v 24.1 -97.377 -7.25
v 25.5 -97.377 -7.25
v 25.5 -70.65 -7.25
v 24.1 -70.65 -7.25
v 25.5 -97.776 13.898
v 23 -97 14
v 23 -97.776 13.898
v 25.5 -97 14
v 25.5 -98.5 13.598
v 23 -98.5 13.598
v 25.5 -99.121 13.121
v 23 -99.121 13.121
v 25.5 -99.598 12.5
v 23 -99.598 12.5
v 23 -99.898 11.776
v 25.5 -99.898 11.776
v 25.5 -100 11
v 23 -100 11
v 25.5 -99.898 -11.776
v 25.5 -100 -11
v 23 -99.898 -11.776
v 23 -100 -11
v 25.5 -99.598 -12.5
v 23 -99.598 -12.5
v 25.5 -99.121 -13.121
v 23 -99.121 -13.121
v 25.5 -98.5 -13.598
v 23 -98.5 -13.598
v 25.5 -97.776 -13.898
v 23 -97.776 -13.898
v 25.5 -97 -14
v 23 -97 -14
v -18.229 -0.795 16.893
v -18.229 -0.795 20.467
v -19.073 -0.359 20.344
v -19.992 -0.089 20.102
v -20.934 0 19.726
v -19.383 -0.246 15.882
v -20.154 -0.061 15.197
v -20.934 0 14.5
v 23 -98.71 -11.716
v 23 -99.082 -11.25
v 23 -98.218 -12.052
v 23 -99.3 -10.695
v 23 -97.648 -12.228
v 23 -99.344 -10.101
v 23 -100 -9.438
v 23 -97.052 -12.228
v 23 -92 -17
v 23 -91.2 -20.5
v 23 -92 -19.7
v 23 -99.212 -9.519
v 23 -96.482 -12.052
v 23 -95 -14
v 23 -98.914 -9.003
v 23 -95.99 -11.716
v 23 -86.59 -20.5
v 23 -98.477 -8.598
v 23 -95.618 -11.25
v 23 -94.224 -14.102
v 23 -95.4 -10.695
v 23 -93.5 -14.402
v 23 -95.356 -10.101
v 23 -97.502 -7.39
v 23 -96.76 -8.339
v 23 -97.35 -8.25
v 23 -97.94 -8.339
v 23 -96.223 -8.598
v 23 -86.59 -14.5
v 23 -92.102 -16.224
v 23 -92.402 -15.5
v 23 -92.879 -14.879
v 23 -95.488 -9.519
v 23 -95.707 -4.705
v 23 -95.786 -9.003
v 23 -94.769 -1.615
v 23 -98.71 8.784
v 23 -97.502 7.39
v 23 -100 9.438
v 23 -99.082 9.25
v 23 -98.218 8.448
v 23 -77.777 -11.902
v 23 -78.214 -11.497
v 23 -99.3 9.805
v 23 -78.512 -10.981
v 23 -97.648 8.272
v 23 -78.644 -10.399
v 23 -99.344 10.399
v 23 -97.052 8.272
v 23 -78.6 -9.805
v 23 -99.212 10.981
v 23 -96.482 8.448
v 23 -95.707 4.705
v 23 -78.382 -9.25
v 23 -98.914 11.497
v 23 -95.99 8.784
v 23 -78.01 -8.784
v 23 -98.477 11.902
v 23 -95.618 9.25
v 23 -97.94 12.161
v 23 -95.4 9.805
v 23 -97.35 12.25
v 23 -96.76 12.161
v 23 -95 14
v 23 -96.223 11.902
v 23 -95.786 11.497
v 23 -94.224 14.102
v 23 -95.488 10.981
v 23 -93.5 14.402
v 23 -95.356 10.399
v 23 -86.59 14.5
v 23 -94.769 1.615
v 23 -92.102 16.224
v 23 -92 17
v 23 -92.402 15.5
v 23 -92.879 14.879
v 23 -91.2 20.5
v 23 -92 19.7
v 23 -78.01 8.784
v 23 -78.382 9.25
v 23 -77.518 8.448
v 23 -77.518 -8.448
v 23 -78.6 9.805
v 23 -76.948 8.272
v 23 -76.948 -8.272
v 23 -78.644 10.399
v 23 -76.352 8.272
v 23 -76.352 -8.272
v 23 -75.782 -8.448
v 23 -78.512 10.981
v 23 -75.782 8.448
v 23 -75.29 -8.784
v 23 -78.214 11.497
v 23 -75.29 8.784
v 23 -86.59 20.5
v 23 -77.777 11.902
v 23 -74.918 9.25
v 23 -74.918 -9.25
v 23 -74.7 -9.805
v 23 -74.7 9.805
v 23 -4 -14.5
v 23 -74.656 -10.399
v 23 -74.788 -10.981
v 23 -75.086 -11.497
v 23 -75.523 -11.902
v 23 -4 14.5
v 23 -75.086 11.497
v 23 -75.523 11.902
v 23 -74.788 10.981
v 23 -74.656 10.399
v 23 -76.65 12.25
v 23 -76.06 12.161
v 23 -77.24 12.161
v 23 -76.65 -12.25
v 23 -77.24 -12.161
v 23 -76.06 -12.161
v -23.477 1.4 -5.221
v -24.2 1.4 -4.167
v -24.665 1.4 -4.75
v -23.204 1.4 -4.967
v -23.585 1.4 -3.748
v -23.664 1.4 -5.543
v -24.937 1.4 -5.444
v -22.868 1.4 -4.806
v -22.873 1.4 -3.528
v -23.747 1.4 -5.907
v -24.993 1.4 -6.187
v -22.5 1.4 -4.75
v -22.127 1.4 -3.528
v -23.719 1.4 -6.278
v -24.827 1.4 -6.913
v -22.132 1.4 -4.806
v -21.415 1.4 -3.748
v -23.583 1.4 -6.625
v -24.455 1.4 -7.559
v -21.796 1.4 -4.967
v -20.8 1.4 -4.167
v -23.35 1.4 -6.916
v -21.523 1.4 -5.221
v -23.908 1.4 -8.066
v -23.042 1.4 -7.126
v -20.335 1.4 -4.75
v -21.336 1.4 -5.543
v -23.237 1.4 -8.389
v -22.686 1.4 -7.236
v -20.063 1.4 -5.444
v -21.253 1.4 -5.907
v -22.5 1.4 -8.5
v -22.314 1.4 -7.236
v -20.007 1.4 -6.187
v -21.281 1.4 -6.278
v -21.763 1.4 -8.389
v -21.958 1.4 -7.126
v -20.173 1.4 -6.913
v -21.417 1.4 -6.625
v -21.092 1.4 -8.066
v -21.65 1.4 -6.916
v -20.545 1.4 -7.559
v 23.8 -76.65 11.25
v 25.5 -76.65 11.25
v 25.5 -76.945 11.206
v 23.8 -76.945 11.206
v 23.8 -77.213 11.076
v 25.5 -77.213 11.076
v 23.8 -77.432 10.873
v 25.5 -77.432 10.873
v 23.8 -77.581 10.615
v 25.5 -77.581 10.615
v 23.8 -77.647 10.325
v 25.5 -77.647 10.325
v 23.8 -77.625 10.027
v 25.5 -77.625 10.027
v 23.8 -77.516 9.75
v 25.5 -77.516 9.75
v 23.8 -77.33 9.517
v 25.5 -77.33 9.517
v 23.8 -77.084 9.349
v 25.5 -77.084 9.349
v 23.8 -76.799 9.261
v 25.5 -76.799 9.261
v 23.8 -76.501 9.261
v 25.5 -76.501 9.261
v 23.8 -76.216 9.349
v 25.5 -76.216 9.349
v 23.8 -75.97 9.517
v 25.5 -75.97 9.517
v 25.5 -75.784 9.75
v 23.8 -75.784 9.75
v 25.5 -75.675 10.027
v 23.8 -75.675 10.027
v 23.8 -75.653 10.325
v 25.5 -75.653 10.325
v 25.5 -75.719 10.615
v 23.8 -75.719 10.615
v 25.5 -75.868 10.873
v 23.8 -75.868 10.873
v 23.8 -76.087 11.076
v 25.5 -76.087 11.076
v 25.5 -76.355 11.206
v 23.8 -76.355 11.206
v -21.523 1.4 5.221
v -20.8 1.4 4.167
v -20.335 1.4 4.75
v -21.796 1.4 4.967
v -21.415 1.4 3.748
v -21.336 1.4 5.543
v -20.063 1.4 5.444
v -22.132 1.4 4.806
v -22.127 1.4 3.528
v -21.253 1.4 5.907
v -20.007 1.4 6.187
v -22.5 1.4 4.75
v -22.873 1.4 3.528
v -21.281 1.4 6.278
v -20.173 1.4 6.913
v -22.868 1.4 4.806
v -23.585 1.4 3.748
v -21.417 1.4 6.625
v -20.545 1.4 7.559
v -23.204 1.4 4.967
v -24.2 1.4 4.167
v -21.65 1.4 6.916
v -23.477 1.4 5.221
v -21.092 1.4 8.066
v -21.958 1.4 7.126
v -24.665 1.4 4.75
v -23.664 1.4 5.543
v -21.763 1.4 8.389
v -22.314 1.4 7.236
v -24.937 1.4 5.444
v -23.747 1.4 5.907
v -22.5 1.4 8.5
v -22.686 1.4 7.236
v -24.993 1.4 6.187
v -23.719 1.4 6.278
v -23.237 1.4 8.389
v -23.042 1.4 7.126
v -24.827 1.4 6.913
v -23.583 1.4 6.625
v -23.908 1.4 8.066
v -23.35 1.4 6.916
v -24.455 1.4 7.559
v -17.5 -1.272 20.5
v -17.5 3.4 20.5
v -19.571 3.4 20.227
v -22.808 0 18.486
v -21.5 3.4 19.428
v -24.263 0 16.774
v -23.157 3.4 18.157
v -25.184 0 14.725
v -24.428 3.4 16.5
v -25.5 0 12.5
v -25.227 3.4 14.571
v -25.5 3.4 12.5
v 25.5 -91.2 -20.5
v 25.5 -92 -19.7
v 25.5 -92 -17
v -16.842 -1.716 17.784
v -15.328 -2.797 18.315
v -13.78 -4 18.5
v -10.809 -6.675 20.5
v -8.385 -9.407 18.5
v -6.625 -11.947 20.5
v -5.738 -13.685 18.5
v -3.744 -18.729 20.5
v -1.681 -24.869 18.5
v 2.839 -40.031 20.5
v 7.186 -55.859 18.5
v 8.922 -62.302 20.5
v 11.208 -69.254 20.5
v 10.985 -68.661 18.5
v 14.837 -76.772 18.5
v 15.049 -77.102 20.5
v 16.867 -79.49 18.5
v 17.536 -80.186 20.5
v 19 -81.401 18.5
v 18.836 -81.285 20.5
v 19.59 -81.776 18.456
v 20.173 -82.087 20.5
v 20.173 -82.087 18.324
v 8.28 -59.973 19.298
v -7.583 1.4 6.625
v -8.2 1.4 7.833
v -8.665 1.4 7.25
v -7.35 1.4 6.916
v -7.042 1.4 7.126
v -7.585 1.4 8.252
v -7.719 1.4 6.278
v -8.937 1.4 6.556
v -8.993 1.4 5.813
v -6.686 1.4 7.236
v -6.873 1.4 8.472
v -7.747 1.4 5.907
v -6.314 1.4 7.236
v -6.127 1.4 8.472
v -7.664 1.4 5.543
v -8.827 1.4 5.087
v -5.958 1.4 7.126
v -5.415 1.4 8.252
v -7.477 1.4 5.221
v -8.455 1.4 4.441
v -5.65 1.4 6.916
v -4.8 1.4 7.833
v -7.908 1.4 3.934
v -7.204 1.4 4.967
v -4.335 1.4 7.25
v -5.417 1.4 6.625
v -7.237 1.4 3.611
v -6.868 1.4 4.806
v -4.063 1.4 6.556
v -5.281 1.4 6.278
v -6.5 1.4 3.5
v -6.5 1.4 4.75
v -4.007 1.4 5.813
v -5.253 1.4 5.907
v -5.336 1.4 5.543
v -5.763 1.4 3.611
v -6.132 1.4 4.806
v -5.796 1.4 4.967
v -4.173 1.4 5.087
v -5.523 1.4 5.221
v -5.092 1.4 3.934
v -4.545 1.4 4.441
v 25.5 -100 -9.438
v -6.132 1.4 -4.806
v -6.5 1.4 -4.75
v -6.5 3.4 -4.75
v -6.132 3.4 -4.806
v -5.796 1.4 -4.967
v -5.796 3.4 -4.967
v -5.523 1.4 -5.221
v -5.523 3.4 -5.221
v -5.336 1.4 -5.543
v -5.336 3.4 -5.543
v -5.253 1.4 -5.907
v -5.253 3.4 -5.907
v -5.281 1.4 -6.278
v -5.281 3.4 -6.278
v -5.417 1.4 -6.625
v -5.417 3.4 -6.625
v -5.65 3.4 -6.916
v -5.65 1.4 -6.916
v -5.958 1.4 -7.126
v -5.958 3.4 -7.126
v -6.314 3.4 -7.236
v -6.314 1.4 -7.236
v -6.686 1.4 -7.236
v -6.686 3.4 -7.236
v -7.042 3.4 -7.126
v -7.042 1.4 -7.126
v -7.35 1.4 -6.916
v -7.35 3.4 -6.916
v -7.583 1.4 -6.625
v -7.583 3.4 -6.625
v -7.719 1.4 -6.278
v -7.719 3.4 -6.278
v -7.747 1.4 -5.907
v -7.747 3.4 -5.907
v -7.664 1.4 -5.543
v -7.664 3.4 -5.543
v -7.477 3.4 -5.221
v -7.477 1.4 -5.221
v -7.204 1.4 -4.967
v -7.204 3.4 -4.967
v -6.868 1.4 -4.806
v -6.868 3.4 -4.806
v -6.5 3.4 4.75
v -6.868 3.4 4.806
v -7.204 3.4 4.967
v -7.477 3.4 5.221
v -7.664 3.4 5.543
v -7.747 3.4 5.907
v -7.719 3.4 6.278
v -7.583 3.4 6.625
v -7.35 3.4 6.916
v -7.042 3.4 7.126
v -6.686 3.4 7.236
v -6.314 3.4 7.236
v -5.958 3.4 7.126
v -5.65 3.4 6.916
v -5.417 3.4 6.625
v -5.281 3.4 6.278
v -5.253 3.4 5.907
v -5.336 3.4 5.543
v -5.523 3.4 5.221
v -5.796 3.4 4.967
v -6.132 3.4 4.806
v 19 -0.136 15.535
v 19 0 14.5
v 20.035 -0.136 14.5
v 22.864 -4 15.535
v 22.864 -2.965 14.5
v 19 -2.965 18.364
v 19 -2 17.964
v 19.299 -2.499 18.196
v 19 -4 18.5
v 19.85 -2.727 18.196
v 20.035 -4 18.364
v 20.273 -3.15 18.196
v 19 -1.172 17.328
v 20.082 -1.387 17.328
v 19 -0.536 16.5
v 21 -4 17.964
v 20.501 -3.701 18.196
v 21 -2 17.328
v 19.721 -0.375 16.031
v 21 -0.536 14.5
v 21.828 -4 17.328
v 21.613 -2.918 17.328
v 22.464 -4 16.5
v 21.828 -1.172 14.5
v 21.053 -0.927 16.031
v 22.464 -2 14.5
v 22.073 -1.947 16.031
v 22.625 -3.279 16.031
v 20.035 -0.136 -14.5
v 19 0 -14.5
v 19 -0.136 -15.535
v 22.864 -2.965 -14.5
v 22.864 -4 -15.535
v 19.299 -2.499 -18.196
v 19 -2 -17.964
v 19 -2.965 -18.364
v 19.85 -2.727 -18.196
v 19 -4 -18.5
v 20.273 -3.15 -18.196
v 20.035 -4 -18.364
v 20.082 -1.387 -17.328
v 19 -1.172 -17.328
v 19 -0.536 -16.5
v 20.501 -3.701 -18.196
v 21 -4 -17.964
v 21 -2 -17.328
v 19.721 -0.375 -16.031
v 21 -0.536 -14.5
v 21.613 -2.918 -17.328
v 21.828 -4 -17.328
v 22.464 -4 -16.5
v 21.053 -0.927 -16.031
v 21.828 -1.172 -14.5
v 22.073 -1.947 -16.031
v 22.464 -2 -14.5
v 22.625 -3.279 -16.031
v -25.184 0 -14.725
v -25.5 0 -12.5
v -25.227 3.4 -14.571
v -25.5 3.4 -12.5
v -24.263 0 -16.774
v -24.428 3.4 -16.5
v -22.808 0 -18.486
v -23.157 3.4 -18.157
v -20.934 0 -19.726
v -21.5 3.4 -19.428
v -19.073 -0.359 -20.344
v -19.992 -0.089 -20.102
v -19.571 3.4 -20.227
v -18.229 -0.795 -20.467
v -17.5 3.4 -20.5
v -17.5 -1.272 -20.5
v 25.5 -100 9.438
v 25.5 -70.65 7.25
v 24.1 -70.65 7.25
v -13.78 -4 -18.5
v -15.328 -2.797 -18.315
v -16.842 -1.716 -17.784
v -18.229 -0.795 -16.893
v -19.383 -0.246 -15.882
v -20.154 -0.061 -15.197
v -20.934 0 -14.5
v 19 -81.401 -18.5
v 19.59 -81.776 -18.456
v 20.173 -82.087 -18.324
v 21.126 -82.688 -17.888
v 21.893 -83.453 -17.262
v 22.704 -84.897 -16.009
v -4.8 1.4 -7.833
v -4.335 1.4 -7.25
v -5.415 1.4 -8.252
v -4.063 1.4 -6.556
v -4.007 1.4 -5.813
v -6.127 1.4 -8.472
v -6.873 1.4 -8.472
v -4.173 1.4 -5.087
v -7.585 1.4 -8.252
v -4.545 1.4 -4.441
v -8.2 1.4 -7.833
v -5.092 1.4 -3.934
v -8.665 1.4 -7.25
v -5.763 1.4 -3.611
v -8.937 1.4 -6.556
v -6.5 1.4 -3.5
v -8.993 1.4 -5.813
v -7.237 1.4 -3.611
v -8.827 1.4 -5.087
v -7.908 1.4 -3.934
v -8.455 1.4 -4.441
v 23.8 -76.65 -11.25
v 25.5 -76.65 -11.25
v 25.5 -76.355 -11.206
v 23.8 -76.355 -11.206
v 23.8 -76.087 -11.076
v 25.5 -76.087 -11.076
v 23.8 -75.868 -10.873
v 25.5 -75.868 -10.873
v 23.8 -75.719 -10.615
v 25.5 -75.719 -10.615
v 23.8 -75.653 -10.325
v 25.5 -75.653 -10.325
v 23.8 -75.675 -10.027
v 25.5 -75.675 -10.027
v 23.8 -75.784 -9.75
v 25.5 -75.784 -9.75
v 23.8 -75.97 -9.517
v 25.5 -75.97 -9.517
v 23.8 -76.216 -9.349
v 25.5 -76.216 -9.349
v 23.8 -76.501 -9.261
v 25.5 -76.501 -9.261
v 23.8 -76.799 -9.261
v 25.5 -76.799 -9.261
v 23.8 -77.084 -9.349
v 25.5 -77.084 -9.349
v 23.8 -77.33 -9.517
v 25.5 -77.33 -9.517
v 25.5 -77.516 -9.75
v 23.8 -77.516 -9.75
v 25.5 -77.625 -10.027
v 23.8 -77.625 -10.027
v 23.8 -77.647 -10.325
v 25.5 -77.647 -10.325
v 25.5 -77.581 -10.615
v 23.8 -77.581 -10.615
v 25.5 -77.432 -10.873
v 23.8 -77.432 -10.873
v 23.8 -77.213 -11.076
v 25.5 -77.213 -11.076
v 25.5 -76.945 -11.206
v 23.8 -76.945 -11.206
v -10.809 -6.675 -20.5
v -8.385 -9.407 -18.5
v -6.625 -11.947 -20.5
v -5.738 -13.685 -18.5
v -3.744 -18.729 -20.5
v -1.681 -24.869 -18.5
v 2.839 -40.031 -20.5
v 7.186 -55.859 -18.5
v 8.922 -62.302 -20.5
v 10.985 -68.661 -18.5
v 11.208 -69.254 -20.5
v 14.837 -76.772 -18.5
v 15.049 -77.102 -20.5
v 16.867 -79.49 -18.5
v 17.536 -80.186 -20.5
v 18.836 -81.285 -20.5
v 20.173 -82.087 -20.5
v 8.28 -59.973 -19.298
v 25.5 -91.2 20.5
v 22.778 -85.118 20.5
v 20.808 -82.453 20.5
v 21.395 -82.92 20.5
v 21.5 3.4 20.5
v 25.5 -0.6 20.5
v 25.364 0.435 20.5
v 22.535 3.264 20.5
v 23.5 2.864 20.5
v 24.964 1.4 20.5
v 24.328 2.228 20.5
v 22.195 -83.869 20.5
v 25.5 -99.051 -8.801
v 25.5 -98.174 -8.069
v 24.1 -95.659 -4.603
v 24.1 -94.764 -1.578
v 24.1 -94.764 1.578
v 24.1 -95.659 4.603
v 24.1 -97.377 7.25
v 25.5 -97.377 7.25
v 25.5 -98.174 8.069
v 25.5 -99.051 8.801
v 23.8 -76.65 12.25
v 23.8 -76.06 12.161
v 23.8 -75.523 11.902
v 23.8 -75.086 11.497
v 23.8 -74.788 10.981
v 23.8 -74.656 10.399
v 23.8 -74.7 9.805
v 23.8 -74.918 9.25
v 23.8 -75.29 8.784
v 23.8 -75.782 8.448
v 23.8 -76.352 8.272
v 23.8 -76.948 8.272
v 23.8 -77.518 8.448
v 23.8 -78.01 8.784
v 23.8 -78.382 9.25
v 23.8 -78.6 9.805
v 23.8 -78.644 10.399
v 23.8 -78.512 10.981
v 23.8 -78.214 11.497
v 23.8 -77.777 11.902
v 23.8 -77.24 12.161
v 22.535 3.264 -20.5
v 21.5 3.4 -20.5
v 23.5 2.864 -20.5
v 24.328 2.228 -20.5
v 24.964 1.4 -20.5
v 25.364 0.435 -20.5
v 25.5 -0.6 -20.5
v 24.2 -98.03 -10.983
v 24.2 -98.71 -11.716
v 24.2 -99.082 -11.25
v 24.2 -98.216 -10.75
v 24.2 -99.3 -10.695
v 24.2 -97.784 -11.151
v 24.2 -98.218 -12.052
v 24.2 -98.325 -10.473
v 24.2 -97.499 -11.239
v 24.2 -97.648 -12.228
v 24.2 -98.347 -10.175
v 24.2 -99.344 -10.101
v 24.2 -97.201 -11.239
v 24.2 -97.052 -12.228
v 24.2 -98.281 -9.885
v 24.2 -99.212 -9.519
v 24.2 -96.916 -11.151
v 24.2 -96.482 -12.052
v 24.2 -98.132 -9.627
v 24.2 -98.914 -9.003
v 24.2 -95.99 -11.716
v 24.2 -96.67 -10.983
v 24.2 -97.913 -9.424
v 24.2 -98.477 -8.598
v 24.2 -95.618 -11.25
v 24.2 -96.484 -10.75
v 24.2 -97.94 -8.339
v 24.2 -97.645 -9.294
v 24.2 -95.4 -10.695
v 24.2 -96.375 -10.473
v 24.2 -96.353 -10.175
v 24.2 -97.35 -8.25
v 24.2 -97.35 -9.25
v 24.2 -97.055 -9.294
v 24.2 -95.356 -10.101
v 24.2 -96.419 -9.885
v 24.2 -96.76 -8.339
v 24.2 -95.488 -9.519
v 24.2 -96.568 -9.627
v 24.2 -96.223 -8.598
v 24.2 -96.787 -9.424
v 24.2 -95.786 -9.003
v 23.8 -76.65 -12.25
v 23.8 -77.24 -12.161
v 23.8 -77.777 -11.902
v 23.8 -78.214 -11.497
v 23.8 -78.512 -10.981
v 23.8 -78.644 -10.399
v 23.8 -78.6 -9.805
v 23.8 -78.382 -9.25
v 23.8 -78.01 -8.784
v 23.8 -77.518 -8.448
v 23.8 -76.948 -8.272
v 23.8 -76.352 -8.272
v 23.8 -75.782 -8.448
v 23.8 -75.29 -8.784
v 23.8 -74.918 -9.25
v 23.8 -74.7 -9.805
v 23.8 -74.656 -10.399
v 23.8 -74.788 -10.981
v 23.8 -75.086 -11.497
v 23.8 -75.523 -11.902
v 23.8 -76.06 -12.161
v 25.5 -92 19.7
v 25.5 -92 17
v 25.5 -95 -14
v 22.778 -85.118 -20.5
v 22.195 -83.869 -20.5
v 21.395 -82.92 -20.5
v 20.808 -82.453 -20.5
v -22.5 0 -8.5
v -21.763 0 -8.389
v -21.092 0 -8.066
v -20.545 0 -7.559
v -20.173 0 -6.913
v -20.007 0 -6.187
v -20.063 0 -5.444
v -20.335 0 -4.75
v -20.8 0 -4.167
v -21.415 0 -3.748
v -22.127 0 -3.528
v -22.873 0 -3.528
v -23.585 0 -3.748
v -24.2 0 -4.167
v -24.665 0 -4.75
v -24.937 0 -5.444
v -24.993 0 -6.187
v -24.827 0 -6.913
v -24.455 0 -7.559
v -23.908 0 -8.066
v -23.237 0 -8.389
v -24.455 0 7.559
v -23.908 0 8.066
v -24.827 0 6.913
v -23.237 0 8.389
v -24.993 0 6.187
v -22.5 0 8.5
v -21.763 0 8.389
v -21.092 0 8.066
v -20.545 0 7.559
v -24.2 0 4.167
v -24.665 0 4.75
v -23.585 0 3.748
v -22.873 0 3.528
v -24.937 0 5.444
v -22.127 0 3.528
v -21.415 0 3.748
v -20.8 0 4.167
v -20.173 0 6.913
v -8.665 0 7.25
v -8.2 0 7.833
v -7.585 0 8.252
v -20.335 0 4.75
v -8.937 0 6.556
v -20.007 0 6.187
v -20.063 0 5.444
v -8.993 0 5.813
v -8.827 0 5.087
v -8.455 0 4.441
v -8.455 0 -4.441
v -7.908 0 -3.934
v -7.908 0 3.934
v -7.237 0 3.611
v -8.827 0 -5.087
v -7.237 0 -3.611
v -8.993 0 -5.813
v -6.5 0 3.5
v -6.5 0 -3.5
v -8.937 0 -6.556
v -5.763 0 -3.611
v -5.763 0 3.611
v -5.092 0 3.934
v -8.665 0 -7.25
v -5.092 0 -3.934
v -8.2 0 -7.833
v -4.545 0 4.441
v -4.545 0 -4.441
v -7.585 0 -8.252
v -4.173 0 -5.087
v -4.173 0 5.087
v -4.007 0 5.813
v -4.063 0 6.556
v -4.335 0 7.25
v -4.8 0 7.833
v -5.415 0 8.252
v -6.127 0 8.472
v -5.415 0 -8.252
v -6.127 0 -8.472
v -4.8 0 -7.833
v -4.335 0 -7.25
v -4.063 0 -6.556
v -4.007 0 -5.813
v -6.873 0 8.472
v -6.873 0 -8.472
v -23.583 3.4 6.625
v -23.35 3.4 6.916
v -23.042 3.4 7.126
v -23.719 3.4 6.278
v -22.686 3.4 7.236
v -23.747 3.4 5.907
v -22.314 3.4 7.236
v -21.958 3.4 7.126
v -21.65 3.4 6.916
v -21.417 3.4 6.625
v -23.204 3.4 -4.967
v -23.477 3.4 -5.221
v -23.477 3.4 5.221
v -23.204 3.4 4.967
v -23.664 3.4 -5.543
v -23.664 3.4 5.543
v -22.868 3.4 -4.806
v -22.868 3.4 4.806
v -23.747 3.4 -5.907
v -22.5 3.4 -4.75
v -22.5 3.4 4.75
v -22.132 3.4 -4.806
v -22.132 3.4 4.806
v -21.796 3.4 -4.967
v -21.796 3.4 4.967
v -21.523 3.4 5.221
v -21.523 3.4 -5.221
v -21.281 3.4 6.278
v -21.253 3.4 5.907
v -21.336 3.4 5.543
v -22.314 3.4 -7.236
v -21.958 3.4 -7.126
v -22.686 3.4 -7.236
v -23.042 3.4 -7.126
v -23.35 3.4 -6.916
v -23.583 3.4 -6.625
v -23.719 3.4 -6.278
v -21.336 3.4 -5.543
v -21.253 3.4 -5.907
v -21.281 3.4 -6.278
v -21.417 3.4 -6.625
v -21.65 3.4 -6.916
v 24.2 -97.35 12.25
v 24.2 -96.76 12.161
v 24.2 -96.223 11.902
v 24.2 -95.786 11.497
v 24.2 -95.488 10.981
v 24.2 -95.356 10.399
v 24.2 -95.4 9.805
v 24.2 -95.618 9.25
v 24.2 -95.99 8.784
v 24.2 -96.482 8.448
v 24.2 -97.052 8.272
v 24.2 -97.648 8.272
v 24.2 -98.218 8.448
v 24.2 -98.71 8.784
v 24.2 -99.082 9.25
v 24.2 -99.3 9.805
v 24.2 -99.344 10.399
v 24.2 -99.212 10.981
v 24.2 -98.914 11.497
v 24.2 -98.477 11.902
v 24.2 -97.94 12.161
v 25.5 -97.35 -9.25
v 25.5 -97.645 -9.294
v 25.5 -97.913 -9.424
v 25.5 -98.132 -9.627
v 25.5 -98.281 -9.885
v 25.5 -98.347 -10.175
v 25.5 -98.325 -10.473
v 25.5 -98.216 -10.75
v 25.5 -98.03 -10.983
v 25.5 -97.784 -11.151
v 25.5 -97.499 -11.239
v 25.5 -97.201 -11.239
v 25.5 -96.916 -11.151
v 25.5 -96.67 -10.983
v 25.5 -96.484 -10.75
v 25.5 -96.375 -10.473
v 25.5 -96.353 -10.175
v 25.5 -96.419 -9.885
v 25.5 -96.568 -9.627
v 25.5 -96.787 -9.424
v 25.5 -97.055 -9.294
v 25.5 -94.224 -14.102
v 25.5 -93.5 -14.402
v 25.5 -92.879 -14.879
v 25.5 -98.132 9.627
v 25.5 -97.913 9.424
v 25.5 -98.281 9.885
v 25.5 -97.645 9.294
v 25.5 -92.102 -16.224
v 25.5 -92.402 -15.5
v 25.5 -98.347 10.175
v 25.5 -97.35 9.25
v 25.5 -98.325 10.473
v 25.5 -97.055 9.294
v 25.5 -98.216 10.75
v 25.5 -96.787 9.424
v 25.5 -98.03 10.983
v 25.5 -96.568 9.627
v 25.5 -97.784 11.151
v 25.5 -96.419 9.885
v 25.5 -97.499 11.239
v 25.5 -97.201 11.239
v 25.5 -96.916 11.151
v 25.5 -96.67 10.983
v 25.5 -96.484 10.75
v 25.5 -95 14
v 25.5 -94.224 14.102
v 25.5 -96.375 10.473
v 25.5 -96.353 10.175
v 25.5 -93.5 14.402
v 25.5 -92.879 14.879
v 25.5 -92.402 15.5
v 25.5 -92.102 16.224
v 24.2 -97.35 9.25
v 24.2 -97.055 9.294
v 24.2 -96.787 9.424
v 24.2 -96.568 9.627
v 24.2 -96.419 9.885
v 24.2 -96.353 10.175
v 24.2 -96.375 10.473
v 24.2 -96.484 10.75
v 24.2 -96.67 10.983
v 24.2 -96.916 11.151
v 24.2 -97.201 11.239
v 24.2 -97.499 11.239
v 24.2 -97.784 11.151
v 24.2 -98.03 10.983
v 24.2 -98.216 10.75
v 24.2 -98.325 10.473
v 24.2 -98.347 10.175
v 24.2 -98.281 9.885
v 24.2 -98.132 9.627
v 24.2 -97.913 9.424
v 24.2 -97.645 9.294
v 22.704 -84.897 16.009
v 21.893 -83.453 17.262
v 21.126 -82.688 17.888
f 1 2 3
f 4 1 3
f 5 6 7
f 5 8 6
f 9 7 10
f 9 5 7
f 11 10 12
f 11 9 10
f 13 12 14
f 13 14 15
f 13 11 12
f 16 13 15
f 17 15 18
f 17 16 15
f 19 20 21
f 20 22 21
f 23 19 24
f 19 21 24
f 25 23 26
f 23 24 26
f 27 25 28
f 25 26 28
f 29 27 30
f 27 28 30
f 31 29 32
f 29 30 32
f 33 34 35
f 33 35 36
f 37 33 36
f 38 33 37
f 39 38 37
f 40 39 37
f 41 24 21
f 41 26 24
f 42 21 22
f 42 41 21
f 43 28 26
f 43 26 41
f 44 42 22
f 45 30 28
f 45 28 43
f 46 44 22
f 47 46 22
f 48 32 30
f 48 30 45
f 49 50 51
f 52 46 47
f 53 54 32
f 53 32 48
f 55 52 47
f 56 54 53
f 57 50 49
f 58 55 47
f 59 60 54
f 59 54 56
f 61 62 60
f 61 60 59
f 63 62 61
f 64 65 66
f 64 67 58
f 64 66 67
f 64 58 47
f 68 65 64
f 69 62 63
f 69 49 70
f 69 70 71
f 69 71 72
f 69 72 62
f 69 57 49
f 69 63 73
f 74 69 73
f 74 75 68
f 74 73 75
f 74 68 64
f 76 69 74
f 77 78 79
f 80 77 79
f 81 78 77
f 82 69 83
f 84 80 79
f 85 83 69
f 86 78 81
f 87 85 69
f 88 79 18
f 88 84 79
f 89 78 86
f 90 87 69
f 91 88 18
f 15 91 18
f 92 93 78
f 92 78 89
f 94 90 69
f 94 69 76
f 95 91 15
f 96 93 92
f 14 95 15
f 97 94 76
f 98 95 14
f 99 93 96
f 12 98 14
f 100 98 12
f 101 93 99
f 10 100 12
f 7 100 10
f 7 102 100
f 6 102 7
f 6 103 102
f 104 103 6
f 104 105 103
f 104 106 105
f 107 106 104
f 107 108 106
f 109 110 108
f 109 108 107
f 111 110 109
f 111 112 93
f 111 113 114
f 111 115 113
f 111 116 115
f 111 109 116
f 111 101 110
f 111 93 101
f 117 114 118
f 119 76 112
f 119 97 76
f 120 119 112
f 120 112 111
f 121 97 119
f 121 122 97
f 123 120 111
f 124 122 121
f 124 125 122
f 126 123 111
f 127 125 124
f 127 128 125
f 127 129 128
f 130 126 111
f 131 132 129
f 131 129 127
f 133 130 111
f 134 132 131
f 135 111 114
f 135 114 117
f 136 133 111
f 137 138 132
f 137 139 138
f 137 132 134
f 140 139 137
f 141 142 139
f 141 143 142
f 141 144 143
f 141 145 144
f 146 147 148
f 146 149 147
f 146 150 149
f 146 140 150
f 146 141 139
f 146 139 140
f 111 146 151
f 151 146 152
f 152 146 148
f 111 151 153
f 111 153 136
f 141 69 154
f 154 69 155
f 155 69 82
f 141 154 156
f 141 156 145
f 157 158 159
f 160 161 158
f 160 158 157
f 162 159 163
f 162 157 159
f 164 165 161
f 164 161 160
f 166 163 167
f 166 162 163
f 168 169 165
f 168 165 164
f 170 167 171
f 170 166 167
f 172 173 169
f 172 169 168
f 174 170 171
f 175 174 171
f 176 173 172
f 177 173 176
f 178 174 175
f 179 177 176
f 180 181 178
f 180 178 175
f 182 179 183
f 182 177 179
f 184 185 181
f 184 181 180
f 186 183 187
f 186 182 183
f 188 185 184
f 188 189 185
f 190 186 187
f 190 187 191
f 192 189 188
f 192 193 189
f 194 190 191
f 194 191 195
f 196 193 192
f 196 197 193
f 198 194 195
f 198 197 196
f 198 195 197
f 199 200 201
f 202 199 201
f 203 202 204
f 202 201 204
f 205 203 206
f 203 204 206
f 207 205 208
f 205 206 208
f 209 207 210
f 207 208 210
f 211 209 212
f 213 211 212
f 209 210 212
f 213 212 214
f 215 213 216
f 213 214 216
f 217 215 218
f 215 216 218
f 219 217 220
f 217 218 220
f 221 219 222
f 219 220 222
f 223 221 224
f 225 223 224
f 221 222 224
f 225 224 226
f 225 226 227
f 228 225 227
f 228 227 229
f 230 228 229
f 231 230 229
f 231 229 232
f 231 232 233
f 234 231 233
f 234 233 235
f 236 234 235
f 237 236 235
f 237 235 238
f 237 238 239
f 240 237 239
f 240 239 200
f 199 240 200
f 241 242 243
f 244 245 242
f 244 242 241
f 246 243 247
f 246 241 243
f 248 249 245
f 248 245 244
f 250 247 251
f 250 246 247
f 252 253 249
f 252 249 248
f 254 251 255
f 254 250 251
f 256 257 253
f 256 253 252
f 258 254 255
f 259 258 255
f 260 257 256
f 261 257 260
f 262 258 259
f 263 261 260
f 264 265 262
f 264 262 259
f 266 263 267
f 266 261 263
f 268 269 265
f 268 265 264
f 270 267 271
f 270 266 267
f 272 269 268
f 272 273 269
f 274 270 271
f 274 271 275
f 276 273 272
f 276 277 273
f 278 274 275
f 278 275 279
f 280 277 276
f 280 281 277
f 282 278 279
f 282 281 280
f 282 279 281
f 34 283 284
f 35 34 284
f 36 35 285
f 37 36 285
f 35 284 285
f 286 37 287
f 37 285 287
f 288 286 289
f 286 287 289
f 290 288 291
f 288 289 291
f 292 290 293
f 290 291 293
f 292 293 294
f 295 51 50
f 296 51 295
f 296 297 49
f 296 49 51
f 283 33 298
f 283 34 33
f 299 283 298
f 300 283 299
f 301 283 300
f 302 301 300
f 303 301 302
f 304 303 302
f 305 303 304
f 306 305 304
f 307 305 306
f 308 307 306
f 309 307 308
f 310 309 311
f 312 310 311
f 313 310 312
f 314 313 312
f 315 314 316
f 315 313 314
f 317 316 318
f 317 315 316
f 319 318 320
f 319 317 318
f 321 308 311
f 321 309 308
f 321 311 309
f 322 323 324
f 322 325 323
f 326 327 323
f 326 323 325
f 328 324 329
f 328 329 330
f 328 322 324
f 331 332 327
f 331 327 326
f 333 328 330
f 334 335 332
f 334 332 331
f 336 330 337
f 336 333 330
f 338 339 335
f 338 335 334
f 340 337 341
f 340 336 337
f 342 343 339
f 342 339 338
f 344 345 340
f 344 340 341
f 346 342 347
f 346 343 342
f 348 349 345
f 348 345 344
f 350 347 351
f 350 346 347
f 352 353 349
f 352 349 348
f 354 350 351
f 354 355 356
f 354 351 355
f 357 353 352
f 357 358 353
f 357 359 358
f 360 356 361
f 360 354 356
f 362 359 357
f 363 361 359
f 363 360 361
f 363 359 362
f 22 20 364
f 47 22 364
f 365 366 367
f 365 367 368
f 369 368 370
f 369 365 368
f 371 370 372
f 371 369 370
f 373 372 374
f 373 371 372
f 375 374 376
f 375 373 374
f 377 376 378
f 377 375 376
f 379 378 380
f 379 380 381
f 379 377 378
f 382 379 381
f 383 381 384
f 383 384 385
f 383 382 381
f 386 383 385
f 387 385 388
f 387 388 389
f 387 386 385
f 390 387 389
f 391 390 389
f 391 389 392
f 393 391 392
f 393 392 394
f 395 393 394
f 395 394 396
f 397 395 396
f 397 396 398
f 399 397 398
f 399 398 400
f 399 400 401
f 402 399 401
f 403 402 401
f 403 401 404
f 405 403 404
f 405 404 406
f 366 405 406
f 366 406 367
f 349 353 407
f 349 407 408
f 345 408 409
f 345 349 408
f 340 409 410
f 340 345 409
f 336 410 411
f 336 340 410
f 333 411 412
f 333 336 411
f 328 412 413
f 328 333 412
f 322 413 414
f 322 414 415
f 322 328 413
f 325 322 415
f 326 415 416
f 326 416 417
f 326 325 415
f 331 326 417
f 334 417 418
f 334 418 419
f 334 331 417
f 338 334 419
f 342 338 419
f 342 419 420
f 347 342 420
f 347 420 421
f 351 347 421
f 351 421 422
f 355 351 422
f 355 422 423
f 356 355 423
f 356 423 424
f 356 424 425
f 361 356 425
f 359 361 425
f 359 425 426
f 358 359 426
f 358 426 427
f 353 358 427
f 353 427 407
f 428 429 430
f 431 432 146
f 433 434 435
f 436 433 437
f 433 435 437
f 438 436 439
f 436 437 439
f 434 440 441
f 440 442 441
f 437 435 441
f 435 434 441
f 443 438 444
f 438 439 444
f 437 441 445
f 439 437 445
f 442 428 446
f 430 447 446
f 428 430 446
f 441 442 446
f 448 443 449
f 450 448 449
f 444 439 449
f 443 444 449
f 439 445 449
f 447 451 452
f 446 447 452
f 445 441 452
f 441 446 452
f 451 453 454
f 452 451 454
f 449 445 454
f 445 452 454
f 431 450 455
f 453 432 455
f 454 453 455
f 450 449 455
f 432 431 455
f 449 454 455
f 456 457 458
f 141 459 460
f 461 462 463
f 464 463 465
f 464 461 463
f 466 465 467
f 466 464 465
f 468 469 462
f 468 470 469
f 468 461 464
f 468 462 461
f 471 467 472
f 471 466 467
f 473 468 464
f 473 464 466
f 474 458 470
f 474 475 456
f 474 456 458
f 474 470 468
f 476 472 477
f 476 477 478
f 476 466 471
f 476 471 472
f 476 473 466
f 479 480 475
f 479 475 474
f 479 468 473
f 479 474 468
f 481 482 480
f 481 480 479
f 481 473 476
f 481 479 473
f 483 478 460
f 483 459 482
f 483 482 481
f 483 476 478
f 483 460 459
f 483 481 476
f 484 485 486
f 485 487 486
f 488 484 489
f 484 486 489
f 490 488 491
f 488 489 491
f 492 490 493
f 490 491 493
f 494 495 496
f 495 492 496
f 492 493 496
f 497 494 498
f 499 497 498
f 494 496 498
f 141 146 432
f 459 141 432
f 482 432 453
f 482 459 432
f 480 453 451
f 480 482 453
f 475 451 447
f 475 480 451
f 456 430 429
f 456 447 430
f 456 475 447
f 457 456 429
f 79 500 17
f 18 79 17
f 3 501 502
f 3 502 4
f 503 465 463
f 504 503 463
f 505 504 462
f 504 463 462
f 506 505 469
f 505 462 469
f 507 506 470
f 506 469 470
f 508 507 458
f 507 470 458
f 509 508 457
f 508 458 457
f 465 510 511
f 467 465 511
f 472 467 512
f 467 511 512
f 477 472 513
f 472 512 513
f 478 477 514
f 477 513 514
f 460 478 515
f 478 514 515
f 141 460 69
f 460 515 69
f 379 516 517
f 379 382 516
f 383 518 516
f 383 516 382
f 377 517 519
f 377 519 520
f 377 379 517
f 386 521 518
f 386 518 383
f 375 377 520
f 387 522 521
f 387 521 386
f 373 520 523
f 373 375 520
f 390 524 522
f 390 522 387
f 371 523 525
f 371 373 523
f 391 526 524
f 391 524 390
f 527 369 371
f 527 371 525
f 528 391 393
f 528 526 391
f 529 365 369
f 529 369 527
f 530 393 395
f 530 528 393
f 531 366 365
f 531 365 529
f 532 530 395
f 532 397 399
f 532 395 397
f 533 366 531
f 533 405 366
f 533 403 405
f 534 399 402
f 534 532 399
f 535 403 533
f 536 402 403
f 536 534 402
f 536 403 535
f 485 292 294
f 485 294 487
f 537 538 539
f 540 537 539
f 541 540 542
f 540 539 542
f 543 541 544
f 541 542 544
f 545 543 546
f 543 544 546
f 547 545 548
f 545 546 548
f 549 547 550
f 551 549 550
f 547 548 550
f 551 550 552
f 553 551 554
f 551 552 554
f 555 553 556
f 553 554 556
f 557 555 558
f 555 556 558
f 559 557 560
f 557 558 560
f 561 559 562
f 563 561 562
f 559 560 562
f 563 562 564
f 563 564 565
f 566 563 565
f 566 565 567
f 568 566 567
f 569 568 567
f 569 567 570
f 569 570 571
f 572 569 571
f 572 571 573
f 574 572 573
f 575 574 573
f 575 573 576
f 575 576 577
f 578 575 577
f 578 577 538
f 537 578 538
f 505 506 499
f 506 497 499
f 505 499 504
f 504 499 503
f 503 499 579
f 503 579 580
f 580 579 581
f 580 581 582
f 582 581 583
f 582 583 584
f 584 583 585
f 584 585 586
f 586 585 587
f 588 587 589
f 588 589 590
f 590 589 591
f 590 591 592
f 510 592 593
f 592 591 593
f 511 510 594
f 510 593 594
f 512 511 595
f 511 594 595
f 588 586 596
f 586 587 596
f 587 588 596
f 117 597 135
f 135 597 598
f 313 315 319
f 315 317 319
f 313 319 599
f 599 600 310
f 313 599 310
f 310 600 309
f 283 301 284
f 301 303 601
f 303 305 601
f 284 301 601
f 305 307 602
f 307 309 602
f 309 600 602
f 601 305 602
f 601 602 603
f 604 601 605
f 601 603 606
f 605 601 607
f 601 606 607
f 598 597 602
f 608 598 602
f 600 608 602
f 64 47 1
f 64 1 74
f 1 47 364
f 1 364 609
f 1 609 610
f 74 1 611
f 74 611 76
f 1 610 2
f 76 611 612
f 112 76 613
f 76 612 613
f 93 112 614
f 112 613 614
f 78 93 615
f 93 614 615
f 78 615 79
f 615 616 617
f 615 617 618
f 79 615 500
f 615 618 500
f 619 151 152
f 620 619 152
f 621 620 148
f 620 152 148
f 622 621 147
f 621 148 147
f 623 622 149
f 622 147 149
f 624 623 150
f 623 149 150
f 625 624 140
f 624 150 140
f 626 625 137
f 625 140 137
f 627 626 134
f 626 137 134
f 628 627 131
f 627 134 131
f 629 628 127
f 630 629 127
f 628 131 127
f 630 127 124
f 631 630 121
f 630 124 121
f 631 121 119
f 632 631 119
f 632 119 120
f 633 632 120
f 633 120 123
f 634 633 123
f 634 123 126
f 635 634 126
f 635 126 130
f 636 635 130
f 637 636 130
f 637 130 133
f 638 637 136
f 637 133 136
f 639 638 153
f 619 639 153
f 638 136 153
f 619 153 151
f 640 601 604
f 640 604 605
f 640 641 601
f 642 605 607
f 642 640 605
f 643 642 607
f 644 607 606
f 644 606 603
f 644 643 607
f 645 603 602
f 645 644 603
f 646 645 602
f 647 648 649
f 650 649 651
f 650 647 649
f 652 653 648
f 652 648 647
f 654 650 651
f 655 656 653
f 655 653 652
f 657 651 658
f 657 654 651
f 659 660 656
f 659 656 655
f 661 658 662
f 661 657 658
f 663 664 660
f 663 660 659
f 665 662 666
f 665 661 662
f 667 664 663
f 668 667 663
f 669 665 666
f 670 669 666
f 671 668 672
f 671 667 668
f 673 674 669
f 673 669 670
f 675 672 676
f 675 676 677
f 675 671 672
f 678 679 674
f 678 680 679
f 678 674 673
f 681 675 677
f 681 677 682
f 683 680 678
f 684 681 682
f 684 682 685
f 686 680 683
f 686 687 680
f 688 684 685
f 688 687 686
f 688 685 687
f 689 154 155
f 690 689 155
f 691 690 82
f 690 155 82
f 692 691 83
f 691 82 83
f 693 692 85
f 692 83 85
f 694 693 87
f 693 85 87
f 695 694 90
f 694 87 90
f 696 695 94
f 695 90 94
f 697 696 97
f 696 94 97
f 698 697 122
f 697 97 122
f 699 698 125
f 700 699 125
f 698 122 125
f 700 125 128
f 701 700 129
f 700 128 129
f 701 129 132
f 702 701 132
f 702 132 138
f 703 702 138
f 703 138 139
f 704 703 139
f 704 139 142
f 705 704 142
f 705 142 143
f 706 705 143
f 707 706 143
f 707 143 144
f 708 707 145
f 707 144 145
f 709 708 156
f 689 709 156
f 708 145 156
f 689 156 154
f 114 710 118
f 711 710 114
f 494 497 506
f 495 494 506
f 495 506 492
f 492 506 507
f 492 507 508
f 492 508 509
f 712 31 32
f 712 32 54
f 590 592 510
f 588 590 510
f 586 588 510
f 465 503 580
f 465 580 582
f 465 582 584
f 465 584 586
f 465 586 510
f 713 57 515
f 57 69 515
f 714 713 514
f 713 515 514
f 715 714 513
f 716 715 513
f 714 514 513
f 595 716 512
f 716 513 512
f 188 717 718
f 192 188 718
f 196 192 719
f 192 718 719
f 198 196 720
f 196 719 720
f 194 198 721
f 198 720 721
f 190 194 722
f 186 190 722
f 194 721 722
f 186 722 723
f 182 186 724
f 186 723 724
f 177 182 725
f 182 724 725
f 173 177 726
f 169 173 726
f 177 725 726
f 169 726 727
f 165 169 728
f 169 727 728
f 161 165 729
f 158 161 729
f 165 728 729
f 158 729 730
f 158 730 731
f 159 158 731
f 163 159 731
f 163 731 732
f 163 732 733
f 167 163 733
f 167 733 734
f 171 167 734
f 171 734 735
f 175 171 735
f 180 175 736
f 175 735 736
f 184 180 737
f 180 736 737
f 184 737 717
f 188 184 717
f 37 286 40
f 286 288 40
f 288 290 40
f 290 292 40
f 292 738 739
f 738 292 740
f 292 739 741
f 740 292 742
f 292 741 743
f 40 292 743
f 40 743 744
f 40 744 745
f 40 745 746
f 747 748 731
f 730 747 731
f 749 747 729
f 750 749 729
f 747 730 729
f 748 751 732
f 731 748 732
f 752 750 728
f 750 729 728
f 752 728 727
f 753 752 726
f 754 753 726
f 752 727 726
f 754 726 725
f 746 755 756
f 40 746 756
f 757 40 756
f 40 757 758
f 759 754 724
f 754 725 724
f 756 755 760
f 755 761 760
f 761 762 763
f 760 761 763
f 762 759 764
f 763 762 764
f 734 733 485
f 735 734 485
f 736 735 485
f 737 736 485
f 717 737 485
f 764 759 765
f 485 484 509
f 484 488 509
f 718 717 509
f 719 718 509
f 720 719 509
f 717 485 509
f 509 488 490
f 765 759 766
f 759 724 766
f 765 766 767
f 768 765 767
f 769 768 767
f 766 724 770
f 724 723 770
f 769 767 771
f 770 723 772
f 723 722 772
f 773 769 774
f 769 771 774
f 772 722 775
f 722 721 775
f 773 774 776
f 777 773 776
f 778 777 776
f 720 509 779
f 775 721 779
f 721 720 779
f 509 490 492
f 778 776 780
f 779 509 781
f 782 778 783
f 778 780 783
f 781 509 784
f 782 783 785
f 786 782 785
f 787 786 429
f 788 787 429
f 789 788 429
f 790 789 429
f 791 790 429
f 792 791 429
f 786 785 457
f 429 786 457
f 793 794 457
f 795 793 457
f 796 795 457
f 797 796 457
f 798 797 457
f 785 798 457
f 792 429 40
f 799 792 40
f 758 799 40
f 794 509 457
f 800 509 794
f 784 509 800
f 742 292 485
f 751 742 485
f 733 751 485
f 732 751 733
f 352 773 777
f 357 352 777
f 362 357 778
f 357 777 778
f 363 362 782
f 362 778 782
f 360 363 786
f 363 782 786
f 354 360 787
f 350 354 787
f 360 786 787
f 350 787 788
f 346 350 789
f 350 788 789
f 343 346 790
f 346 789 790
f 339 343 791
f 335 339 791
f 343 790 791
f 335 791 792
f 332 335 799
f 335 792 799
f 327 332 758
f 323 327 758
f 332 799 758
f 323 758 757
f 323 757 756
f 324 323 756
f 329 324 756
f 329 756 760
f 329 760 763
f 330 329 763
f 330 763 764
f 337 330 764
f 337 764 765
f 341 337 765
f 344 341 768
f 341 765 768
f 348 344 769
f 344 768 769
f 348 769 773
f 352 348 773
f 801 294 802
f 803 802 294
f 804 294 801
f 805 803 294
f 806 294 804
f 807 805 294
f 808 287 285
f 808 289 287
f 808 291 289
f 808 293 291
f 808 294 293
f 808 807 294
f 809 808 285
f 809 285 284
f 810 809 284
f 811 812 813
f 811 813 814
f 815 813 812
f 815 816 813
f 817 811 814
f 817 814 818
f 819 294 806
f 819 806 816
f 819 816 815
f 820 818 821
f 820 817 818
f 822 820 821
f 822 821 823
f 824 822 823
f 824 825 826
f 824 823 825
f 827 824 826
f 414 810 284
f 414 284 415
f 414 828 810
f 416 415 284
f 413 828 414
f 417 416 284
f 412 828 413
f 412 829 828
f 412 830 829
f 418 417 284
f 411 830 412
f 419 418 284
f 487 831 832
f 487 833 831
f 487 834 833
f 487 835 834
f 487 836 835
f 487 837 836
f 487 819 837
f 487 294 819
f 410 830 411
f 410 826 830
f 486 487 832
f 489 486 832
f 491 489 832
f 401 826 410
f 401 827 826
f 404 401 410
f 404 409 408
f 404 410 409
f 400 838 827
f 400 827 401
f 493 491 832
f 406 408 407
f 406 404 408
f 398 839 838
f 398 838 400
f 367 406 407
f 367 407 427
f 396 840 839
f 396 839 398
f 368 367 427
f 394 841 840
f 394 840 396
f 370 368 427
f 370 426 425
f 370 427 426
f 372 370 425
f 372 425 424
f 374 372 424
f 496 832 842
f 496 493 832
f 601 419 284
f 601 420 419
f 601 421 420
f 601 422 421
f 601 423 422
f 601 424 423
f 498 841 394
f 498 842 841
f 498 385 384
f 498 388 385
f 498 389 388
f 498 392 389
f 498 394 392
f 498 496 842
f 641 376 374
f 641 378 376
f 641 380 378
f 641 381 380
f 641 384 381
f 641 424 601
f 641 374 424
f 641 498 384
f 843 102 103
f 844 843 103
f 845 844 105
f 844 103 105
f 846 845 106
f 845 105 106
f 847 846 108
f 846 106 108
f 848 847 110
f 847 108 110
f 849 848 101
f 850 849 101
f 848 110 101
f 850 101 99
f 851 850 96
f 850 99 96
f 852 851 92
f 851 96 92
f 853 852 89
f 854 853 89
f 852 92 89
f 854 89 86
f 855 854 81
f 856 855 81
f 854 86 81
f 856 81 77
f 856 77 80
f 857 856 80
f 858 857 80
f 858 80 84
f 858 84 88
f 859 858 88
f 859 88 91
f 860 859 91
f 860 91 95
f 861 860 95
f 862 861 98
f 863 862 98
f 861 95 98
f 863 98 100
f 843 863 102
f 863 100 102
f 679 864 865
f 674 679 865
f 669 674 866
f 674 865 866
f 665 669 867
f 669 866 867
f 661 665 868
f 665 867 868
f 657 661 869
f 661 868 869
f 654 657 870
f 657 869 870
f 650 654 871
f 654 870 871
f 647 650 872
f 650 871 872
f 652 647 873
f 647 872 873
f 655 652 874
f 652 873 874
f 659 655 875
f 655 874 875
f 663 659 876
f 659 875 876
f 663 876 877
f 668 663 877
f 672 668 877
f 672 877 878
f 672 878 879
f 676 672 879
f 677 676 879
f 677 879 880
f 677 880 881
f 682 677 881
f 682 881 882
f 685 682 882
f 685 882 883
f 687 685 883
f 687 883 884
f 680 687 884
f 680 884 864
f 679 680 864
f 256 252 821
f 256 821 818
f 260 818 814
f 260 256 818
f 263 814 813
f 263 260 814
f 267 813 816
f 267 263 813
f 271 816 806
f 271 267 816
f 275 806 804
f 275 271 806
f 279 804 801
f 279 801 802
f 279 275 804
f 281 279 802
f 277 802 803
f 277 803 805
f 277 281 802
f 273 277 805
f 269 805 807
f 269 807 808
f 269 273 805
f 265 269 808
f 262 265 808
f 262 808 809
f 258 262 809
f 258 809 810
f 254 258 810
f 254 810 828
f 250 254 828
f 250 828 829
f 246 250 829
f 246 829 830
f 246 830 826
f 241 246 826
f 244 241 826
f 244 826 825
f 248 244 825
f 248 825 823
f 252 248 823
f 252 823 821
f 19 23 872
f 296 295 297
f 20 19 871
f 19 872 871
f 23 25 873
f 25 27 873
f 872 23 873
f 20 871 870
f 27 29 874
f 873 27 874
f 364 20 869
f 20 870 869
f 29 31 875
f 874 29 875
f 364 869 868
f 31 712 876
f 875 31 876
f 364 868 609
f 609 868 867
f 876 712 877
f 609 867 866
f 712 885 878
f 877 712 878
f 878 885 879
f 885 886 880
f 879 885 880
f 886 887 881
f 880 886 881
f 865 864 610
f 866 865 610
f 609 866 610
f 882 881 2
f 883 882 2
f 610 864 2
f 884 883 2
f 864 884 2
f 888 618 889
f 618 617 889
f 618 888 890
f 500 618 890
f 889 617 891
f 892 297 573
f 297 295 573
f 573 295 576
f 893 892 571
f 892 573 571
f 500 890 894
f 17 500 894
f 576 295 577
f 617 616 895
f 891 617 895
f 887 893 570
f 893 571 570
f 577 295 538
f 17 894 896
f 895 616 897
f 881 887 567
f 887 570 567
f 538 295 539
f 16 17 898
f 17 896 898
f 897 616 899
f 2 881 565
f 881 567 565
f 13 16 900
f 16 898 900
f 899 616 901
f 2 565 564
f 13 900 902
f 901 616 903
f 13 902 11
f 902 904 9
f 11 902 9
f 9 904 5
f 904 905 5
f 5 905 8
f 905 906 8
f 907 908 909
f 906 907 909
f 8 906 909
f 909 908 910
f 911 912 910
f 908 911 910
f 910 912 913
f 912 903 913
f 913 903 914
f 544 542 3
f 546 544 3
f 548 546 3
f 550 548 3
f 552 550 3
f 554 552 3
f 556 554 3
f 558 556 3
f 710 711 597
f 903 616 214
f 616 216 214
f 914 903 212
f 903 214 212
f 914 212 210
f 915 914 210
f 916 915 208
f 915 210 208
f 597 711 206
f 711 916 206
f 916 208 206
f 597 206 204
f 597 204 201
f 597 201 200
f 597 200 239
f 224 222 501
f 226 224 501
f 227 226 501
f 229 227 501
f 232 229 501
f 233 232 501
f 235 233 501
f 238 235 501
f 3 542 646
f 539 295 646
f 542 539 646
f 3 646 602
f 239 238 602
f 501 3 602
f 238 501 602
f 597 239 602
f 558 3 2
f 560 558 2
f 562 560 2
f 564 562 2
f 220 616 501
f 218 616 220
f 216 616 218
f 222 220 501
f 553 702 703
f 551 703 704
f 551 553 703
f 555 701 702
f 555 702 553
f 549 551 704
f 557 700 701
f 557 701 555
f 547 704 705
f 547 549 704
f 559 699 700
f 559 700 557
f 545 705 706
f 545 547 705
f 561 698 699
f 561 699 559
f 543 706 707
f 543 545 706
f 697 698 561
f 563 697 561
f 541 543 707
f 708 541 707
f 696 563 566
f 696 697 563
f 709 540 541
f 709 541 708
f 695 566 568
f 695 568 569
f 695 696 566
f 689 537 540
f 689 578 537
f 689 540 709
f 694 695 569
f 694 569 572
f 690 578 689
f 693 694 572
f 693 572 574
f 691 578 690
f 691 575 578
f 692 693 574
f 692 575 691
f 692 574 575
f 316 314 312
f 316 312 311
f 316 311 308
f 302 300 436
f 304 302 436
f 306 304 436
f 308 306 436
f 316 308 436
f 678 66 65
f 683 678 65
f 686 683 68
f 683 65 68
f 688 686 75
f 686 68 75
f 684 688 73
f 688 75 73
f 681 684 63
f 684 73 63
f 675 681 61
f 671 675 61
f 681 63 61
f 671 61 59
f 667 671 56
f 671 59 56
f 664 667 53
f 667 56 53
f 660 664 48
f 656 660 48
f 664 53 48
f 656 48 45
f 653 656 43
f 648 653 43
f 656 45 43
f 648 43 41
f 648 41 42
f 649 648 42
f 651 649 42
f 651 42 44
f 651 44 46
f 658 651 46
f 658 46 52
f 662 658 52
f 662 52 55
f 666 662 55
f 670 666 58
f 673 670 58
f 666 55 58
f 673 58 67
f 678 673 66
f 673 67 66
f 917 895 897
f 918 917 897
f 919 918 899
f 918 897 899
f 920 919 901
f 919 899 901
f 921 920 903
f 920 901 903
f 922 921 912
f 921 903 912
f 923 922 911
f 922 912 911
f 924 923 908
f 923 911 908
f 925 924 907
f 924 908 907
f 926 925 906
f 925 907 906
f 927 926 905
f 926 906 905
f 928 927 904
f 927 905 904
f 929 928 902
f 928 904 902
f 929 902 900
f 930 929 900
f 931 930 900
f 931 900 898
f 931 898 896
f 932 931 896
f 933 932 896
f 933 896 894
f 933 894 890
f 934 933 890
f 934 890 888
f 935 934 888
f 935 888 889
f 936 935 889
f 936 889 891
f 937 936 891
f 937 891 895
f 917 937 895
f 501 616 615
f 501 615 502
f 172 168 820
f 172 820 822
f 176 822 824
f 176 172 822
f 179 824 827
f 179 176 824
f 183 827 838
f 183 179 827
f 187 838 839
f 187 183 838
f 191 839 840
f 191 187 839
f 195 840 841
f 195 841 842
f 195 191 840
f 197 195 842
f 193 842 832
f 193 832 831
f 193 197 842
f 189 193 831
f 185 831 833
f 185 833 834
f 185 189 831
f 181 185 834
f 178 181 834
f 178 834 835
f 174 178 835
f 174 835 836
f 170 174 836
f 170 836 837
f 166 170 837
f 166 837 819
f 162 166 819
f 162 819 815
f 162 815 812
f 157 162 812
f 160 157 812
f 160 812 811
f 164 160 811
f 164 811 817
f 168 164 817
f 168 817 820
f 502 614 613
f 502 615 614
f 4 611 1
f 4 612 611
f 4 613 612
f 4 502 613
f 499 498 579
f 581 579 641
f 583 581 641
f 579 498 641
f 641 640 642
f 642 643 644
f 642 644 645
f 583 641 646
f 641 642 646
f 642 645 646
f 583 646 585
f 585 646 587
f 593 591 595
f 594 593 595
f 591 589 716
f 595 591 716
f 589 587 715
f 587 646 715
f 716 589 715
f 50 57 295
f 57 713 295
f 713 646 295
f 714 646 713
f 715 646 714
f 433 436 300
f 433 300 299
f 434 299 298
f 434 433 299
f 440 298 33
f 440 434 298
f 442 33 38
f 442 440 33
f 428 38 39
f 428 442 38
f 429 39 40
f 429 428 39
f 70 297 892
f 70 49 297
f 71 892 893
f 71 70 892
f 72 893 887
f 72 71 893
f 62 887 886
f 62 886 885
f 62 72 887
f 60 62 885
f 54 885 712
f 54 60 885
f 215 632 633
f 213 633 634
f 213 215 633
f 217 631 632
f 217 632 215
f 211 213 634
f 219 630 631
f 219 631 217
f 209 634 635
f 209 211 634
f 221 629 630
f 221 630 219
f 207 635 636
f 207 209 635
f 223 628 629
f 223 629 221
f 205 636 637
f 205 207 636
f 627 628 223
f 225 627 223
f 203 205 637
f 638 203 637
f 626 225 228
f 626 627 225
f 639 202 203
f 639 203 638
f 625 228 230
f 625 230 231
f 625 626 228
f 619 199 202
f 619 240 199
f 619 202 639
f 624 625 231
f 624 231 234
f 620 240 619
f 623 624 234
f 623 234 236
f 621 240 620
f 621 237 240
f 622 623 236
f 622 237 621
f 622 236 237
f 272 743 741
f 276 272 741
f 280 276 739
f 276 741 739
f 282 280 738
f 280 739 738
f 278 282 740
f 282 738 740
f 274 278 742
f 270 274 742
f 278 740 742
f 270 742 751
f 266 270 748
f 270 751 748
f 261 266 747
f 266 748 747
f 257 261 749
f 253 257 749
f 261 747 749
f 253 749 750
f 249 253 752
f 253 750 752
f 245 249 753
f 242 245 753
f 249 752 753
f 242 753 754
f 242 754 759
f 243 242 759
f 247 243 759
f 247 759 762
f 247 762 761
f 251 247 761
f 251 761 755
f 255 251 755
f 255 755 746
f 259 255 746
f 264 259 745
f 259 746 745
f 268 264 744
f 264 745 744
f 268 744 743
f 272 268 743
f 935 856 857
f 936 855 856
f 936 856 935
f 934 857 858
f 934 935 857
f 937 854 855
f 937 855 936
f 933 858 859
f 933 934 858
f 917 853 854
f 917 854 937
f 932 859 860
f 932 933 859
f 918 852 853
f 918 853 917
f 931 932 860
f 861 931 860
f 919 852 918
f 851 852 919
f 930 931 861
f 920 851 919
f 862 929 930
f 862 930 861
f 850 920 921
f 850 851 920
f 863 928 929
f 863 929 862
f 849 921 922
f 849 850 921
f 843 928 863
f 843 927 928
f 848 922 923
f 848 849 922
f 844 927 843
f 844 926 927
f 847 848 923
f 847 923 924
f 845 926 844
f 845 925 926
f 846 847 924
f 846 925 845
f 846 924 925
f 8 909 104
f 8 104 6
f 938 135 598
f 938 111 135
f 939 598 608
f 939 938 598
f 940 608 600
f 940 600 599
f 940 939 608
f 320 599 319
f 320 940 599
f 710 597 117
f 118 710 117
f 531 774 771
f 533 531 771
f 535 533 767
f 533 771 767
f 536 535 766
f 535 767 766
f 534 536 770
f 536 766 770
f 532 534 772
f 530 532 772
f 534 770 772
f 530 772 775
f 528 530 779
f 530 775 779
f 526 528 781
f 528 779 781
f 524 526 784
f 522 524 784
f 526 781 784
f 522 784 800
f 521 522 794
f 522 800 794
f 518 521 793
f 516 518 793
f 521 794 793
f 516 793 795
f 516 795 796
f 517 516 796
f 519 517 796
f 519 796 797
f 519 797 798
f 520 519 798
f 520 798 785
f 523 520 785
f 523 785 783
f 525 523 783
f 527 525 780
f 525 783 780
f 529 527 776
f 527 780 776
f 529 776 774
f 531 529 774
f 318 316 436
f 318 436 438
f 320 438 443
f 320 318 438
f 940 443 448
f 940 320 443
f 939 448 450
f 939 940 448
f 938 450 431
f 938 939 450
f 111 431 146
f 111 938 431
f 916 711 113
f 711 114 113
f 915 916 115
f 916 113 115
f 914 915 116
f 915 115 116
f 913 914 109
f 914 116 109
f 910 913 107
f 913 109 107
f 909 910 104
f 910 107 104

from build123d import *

# Parameters (mm, degrees)
SKETCH_1_W          = 51
SKETCH_1_H          = 41
SKETCH_1_R          = 1.25
EXTRUDE_1_DEPTH     = 3.4
SKETCH_2_R          = 1
EXTRUDE_2_DEPTH     = 2.5
SKETCH_3_W          = 14.5
SKETCH_3_H          = 35.737354226
CUT_EXTRUDE_1_DEPTH = 1.4
EXTRUDE_4_DEPTH     = 2
FILLET_1_R          = 8
FILLET_2_R          = 4
SKETCH_6_R          = 2
CUT_EXTRUDE_2_DEPTH = 1.2
CUT_EXTRUDE_3_DEPTH = 4
FILLET_3_R          = 3
SKETCH_9_R          = 2
CUT_EXTRUDE_4_DEPTH = 0.8
SKETCH_10_R         = 2.5
CUT_EXTRUDE_5_DEPTH = 1.4
CHAMFER_1_SIZE      = 0.8
FILLET_4_R          = 4
FILLET_5_R          = 5


with BuildPart() as part:
    # 草图1 → 凸台-拉伸1 (new body)
    with BuildSketch(Plane(origin=(0, 0, 0), x_dir=(1, 0, 0), z_dir=(0, 1, 0))):
        Rectangle(SKETCH_1_W, SKETCH_1_H)
        with Locations(Location((-22.5, 6, 0), (0, 0, 270))):
            Circle(SKETCH_1_R, mode=Mode.SUBTRACT)
        with Locations(Location((-22.5, -6, 0), (0, 0, 90))):
            Circle(SKETCH_1_R, mode=Mode.SUBTRACT)
        with Locations(Location((-6.5, 6, 0), (0, 0, 270))):
            Circle(SKETCH_1_R, mode=Mode.SUBTRACT)
        with Locations(Location((-6.5, -6, 0), (0, 0, 90))):
            Circle(SKETCH_1_R, mode=Mode.SUBTRACT)
    extrude(amount=EXTRUDE_1_DEPTH)

    # 草图2 → 凸台-拉伸2 (add)
    with BuildSketch(Plane(origin=(25.5, 0, 0), x_dir=(0, 0, -1), z_dir=(1, 0, 0))):
        with BuildLine():
            Line((-20.5, 0), (20.5, 0))
            Line((20.5, 0), (20.5, -100))
            Line((20.5, -100), (9.43808773, -100))
            ThreePointArc((9.43808773, -100), (0, -94.65), (-9.43808773, -100))
            Line((-9.43808773, -100), (-20.5, -100))
            Line((-20.5, -100), (-20.5, 0))
        make_face()
        with Locations((-10.25, -97.35)):
            Circle(SKETCH_2_R, mode=Mode.SUBTRACT)
        with Locations(Location((10.25, -97.35, 0), (0, 0, 180))):
            Circle(SKETCH_2_R, mode=Mode.SUBTRACT)
        with Locations((10.25, -76.65)):
            Circle(SKETCH_2_R, mode=Mode.SUBTRACT)
        with Locations(Location((-10.25, -76.65, 0), (0, 0, 180))):
            Circle(SKETCH_2_R, mode=Mode.SUBTRACT)
    extrude(amount=-EXTRUDE_2_DEPTH)

    # 草图3 → 切除-拉伸1 (cut)
    with BuildSketch(Plane(origin=(25.5, 0, 0), x_dir=(0, 0, -1), z_dir=(1, 0, 0))):
        with Locations((0, -88.518677113)):
            Rectangle(SKETCH_3_W, SKETCH_3_H)
    extrude(amount=-CUT_EXTRUDE_1_DEPTH, mode=Mode.SUBTRACT)

    # 草图5 → 凸台-拉伸4 (add)
    with BuildSketch(Plane(origin=(0, 0, -20.5), x_dir=(-1, 0, 0), z_dir=(0, 0, -1))):
        with BuildLine():
            Line((-25.5, 3.4), (19.5, 3.4))
            Line((19.5, 3.4), (19.5, 0))
            add(Edge.make_bspline(
                [(19.5, 0), (10.67122189, -5.3692624), (2.779429236, -18.193392293), (-14.23746955, -82.475470635), (-23, -82.805044976)],
                knots=[0, 0, 0, 0.396049025, 0.788579615, 1, 1, 1], degree=2))
            Line((-23, -82.805044976), (-25.5, -82.805044976))
            Line((-25.5, -82.805044976), (-25.5, 3.4))
        make_face()
    extrude_4 = extrude(amount=-EXTRUDE_4_DEPTH)

    # 镜向3: 凸台-拉伸4 across plane
    add(extrude_4.mirror(Plane.XY))

    # 圆角1
    fillet_1_edges = [part.edges().sort_by_distance(p)[0] for p in [
        (-25.5, 1.7, -20.5),
        (-25.5, 1.7, 20.5),
    ]]
    fillet(fillet_1_edges, radius=FILLET_1_R)

    # 圆角2
    fillet_2_edges = [part.edges().sort_by_distance(p)[0] for p in [
        (25.5, 3.4, 0),
        (23, 0, 0),
    ]]
    fillet(fillet_2_edges, radius=FILLET_2_R)

    # 草图6 → 切除-拉伸2 (cut)
    with BuildSketch(Plane.ZY.offset(-23)):
        with Locations((10.25, -97.35)):
            Circle(SKETCH_6_R)
        with Locations((-10.25, -97.35)):
            Circle(SKETCH_6_R)
    extrude(amount=-CUT_EXTRUDE_2_DEPTH, mode=Mode.SUBTRACT)

    # 草图8 → 切除-拉伸3 (cut)
    with BuildSketch(Plane(origin=(25.5, 0, 0), x_dir=(0, 0, -1), z_dir=(1, 0, 0))):
        Polygon((14, -102.818047241), (14, -92), (23.468492482, -92), (23.468492482, -110.008191191), (-23.468492482, -110.008191191), (-23.468492482, -92), (-14, -92), (-14, -102.818047241), align=None)
    extrude(amount=-CUT_EXTRUDE_3_DEPTH, mode=Mode.SUBTRACT)

    # 圆角3
    fillet_3_edges = [part.edges().sort_by_distance(p)[0] for p in [
        (24.25, -100, 14),
        (24.25, -100, -14),
        (24.25, -92, -14),
        (24.25, -92, 14),
    ]]
    fillet(fillet_3_edges, radius=FILLET_3_R)

    # 草图9 → 切除-拉伸4 (cut)
    with BuildSketch(Plane.ZY.offset(-23)):
        with Locations((10.25, -76.65)):
            Circle(SKETCH_9_R)
        with Locations(Location((-10.25, -76.65, 0), (0, 0, 180))):
            Circle(SKETCH_9_R)
    extrude(amount=-CUT_EXTRUDE_4_DEPTH, mode=Mode.SUBTRACT)

    # 草图10 → 切除-拉伸5 (cut)
    with BuildSketch(Plane(origin=(0, 0, 0), x_dir=(-1, 0, 0), z_dir=(0, -1, 0))):
        with Locations(Location((6.5, -6, 0), (0, 0, 90))):
            Circle(SKETCH_10_R)
        with Locations(Location((22.5, -6, 0), (0, 0, 270))):
            Circle(SKETCH_10_R)
        with Locations(Location((6.5, 6, 0), (0, 0, 270))):
            Circle(SKETCH_10_R)
        with Locations(Location((22.5, 6, 0), (0, 0, 90))):
            Circle(SKETCH_10_R)
    extrude(amount=-CUT_EXTRUDE_5_DEPTH, mode=Mode.SUBTRACT)

    # 倒角1
    chamfer_1_edges = [part.edges().sort_by_distance(p)[0] for p in [
        (24.25, -92, 20.5),
        (24.25, -92, -20.5),
    ]]
    chamfer(chamfer_1_edges, length=CHAMFER_1_SIZE)

    # 圆角4
    fillet_4_edges = [part.edges().sort_by_distance(p)[0] for p in [
        (-0.25, 0, -18.5),
        (21.828427125, -1.171572875, -18.5),
        (-0.25, 0, 18.5),
        (21.828427125, -1.171572875, 18.5),
        (23, -43.402522488, -18.5),
        (23, -43.402522488, 18.5),
    ]]
    fillet(fillet_4_edges, radius=FILLET_4_R)

    # 圆角5
    fillet_5_edges = [part.edges().sort_by_distance(p)[0] for p in [
        (23, -82.805044976, 16.5),
        (23, -82.805044976, -16.5),
        (-19.5, 0, 16.5),
        (-19.5, 0, -16.5),
    ]]
    fillet(fillet_5_edges, radius=FILLET_5_R)


solid = part.part
